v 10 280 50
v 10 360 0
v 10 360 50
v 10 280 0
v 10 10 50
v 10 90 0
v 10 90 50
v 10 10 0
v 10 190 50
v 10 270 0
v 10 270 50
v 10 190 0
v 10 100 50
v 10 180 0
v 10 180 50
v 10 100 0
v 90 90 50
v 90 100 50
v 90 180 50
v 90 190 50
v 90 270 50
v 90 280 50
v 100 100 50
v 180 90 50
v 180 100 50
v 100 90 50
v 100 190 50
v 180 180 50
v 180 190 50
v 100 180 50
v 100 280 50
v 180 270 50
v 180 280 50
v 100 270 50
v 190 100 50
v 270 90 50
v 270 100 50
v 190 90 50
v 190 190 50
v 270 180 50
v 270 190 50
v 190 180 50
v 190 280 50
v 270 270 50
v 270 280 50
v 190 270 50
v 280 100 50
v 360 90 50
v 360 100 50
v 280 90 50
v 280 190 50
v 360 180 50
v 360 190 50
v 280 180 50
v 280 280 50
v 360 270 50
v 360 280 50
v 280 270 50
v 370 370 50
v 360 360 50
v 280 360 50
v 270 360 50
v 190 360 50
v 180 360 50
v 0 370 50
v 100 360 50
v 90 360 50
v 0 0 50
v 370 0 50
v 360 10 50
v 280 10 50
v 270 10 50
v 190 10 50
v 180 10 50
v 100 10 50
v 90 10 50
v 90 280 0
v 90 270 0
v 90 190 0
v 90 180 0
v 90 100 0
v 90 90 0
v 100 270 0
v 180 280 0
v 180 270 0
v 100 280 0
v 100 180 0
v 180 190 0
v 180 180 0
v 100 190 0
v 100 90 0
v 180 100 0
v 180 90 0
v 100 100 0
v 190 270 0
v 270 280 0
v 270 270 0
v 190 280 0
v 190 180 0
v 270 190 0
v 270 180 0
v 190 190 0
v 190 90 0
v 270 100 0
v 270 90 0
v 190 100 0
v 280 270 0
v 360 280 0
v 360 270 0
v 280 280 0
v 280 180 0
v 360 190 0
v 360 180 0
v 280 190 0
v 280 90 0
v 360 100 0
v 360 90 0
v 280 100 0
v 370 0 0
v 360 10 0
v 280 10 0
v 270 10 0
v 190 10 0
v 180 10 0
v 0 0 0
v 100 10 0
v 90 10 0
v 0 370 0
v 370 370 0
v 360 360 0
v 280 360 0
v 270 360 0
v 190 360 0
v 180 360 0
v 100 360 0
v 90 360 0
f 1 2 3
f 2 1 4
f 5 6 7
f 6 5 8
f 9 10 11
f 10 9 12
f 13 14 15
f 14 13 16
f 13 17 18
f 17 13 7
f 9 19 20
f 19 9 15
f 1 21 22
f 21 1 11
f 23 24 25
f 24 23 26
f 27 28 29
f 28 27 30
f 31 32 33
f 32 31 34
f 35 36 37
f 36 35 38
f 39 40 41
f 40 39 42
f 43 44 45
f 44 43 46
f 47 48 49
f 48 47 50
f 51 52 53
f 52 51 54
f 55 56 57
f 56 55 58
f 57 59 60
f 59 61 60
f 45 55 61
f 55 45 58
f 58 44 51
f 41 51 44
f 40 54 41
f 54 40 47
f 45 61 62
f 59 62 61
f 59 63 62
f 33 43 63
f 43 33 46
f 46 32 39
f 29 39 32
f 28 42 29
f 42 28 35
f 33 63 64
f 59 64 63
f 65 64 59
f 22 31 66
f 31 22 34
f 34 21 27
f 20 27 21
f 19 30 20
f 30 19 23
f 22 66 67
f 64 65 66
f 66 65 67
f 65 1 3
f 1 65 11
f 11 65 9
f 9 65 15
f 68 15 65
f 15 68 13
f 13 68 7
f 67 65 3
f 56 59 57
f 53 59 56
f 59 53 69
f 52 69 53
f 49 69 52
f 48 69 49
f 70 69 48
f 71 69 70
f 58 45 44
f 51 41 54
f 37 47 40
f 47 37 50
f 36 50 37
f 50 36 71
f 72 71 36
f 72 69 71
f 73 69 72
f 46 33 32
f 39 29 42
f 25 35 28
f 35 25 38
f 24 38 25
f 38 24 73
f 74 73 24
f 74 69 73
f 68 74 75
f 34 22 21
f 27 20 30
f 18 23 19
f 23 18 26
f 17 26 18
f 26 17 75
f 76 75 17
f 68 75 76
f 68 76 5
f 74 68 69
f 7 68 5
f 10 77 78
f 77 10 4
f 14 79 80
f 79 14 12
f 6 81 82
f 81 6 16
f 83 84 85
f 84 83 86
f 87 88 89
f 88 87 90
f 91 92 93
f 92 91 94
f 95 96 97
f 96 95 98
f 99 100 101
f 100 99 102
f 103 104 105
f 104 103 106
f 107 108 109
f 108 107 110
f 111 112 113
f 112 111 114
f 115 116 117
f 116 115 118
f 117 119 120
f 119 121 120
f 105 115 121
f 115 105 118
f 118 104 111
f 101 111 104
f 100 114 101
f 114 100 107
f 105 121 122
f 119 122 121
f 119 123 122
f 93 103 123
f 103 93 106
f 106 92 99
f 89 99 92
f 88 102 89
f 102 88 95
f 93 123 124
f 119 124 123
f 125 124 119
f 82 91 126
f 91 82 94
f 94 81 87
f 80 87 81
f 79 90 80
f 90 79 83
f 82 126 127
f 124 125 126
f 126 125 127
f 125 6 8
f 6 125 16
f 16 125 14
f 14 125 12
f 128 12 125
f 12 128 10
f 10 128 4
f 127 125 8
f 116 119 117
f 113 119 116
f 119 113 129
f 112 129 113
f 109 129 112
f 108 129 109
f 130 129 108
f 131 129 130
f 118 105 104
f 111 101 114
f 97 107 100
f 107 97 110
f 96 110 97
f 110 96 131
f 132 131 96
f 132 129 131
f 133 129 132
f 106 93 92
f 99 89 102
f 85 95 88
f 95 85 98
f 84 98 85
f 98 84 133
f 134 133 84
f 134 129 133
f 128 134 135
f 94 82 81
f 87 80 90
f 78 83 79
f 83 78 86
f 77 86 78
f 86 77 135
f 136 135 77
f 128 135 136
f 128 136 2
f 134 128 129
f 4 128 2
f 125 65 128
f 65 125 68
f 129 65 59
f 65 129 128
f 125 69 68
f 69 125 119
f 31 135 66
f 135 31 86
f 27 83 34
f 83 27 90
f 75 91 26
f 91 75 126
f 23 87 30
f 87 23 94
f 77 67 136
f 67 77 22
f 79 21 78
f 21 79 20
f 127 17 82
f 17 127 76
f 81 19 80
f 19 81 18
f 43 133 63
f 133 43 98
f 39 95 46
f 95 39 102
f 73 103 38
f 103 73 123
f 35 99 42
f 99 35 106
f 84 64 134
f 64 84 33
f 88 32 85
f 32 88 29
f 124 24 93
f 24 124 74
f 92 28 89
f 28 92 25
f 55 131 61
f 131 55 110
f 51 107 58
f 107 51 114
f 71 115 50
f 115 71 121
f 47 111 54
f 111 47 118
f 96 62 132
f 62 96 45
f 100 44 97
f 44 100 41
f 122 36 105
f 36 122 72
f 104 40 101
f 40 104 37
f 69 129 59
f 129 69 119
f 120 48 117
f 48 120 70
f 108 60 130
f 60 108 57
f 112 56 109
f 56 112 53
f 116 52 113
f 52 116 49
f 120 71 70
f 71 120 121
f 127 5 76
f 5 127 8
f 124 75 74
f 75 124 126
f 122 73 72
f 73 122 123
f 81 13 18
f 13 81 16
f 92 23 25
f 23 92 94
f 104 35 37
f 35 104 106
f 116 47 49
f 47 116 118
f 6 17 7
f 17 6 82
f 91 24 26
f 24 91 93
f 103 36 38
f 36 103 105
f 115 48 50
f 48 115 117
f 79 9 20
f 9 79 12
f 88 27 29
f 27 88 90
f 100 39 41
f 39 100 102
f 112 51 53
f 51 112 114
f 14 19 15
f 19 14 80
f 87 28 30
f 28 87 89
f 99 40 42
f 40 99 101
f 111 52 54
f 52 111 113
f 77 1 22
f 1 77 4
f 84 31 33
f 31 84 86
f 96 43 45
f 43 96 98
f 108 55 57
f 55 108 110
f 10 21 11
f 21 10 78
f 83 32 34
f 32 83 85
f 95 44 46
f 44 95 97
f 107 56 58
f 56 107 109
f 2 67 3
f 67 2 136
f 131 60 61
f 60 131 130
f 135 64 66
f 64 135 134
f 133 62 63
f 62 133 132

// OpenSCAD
// OpenSCAD: One 50 mm-thick slice (370 x 370 x 50) of a 3D printed cage grid
// Grid: 5 bars along X (width 370, cross-section 10x10), 5 bars along Y (length 370), plus 4 corner vertical bars (Z-direction) with M6 clearance holes
// Parameters
t = 10; // bar thickness (mm), square cross-section 10x10
g = 80; // gap between adjacent bars (mm)
size = 370; // outer footprint (X and Y) in mm
height_slice = 50; // slice thickness along Z (mm)
hole_d = 6.5; // through-hole diameter for M6 clearance (mm)
hole_r = hole_d / 2;

module corner_bar_with_hole(cx, cy)
{
  // Corner bar: 10x10x50 with through-hole centered in the bar
  difference()
  {
    translate([cx, cy, 0]) cube([t, t, height_slice]);
    translate([cx + t / 2, cy + t / 2, 0]) cylinder(h = height_slice, r = hole_r, center = false);
  }
}

module grid_slice()
{
  // Bars along Y (vertical strands in X direction)
  for(i = [0, 1, 2, 3, 4])
  {
    x = i * (t + g);
    translate([x, 0, 0]) cube([t, size, height_slice]);
  }
  // Bars along X (horizontal strands in Y direction)
  for(j = [0, 1, 2, 3, 4])
  {
    y = j * (t + g);
    translate([0, y, 0]) cube([size, t, height_slice]);
  }
  // Corner vertical bars with through-holes (Z-direction)
  corner_bar_with_hole(0, 0); // bottom-left
  corner_bar_with_hole(size -t, 0); // bottom-right (x=360)
  corner_bar_with_hole(0, size -t); // top-left (y=360)
  corner_bar_with_hole(size -t, size -t); // top-right (x=360, y=360)
}

// Render one slice at its local origin (0,0,0)
grid_slice();
